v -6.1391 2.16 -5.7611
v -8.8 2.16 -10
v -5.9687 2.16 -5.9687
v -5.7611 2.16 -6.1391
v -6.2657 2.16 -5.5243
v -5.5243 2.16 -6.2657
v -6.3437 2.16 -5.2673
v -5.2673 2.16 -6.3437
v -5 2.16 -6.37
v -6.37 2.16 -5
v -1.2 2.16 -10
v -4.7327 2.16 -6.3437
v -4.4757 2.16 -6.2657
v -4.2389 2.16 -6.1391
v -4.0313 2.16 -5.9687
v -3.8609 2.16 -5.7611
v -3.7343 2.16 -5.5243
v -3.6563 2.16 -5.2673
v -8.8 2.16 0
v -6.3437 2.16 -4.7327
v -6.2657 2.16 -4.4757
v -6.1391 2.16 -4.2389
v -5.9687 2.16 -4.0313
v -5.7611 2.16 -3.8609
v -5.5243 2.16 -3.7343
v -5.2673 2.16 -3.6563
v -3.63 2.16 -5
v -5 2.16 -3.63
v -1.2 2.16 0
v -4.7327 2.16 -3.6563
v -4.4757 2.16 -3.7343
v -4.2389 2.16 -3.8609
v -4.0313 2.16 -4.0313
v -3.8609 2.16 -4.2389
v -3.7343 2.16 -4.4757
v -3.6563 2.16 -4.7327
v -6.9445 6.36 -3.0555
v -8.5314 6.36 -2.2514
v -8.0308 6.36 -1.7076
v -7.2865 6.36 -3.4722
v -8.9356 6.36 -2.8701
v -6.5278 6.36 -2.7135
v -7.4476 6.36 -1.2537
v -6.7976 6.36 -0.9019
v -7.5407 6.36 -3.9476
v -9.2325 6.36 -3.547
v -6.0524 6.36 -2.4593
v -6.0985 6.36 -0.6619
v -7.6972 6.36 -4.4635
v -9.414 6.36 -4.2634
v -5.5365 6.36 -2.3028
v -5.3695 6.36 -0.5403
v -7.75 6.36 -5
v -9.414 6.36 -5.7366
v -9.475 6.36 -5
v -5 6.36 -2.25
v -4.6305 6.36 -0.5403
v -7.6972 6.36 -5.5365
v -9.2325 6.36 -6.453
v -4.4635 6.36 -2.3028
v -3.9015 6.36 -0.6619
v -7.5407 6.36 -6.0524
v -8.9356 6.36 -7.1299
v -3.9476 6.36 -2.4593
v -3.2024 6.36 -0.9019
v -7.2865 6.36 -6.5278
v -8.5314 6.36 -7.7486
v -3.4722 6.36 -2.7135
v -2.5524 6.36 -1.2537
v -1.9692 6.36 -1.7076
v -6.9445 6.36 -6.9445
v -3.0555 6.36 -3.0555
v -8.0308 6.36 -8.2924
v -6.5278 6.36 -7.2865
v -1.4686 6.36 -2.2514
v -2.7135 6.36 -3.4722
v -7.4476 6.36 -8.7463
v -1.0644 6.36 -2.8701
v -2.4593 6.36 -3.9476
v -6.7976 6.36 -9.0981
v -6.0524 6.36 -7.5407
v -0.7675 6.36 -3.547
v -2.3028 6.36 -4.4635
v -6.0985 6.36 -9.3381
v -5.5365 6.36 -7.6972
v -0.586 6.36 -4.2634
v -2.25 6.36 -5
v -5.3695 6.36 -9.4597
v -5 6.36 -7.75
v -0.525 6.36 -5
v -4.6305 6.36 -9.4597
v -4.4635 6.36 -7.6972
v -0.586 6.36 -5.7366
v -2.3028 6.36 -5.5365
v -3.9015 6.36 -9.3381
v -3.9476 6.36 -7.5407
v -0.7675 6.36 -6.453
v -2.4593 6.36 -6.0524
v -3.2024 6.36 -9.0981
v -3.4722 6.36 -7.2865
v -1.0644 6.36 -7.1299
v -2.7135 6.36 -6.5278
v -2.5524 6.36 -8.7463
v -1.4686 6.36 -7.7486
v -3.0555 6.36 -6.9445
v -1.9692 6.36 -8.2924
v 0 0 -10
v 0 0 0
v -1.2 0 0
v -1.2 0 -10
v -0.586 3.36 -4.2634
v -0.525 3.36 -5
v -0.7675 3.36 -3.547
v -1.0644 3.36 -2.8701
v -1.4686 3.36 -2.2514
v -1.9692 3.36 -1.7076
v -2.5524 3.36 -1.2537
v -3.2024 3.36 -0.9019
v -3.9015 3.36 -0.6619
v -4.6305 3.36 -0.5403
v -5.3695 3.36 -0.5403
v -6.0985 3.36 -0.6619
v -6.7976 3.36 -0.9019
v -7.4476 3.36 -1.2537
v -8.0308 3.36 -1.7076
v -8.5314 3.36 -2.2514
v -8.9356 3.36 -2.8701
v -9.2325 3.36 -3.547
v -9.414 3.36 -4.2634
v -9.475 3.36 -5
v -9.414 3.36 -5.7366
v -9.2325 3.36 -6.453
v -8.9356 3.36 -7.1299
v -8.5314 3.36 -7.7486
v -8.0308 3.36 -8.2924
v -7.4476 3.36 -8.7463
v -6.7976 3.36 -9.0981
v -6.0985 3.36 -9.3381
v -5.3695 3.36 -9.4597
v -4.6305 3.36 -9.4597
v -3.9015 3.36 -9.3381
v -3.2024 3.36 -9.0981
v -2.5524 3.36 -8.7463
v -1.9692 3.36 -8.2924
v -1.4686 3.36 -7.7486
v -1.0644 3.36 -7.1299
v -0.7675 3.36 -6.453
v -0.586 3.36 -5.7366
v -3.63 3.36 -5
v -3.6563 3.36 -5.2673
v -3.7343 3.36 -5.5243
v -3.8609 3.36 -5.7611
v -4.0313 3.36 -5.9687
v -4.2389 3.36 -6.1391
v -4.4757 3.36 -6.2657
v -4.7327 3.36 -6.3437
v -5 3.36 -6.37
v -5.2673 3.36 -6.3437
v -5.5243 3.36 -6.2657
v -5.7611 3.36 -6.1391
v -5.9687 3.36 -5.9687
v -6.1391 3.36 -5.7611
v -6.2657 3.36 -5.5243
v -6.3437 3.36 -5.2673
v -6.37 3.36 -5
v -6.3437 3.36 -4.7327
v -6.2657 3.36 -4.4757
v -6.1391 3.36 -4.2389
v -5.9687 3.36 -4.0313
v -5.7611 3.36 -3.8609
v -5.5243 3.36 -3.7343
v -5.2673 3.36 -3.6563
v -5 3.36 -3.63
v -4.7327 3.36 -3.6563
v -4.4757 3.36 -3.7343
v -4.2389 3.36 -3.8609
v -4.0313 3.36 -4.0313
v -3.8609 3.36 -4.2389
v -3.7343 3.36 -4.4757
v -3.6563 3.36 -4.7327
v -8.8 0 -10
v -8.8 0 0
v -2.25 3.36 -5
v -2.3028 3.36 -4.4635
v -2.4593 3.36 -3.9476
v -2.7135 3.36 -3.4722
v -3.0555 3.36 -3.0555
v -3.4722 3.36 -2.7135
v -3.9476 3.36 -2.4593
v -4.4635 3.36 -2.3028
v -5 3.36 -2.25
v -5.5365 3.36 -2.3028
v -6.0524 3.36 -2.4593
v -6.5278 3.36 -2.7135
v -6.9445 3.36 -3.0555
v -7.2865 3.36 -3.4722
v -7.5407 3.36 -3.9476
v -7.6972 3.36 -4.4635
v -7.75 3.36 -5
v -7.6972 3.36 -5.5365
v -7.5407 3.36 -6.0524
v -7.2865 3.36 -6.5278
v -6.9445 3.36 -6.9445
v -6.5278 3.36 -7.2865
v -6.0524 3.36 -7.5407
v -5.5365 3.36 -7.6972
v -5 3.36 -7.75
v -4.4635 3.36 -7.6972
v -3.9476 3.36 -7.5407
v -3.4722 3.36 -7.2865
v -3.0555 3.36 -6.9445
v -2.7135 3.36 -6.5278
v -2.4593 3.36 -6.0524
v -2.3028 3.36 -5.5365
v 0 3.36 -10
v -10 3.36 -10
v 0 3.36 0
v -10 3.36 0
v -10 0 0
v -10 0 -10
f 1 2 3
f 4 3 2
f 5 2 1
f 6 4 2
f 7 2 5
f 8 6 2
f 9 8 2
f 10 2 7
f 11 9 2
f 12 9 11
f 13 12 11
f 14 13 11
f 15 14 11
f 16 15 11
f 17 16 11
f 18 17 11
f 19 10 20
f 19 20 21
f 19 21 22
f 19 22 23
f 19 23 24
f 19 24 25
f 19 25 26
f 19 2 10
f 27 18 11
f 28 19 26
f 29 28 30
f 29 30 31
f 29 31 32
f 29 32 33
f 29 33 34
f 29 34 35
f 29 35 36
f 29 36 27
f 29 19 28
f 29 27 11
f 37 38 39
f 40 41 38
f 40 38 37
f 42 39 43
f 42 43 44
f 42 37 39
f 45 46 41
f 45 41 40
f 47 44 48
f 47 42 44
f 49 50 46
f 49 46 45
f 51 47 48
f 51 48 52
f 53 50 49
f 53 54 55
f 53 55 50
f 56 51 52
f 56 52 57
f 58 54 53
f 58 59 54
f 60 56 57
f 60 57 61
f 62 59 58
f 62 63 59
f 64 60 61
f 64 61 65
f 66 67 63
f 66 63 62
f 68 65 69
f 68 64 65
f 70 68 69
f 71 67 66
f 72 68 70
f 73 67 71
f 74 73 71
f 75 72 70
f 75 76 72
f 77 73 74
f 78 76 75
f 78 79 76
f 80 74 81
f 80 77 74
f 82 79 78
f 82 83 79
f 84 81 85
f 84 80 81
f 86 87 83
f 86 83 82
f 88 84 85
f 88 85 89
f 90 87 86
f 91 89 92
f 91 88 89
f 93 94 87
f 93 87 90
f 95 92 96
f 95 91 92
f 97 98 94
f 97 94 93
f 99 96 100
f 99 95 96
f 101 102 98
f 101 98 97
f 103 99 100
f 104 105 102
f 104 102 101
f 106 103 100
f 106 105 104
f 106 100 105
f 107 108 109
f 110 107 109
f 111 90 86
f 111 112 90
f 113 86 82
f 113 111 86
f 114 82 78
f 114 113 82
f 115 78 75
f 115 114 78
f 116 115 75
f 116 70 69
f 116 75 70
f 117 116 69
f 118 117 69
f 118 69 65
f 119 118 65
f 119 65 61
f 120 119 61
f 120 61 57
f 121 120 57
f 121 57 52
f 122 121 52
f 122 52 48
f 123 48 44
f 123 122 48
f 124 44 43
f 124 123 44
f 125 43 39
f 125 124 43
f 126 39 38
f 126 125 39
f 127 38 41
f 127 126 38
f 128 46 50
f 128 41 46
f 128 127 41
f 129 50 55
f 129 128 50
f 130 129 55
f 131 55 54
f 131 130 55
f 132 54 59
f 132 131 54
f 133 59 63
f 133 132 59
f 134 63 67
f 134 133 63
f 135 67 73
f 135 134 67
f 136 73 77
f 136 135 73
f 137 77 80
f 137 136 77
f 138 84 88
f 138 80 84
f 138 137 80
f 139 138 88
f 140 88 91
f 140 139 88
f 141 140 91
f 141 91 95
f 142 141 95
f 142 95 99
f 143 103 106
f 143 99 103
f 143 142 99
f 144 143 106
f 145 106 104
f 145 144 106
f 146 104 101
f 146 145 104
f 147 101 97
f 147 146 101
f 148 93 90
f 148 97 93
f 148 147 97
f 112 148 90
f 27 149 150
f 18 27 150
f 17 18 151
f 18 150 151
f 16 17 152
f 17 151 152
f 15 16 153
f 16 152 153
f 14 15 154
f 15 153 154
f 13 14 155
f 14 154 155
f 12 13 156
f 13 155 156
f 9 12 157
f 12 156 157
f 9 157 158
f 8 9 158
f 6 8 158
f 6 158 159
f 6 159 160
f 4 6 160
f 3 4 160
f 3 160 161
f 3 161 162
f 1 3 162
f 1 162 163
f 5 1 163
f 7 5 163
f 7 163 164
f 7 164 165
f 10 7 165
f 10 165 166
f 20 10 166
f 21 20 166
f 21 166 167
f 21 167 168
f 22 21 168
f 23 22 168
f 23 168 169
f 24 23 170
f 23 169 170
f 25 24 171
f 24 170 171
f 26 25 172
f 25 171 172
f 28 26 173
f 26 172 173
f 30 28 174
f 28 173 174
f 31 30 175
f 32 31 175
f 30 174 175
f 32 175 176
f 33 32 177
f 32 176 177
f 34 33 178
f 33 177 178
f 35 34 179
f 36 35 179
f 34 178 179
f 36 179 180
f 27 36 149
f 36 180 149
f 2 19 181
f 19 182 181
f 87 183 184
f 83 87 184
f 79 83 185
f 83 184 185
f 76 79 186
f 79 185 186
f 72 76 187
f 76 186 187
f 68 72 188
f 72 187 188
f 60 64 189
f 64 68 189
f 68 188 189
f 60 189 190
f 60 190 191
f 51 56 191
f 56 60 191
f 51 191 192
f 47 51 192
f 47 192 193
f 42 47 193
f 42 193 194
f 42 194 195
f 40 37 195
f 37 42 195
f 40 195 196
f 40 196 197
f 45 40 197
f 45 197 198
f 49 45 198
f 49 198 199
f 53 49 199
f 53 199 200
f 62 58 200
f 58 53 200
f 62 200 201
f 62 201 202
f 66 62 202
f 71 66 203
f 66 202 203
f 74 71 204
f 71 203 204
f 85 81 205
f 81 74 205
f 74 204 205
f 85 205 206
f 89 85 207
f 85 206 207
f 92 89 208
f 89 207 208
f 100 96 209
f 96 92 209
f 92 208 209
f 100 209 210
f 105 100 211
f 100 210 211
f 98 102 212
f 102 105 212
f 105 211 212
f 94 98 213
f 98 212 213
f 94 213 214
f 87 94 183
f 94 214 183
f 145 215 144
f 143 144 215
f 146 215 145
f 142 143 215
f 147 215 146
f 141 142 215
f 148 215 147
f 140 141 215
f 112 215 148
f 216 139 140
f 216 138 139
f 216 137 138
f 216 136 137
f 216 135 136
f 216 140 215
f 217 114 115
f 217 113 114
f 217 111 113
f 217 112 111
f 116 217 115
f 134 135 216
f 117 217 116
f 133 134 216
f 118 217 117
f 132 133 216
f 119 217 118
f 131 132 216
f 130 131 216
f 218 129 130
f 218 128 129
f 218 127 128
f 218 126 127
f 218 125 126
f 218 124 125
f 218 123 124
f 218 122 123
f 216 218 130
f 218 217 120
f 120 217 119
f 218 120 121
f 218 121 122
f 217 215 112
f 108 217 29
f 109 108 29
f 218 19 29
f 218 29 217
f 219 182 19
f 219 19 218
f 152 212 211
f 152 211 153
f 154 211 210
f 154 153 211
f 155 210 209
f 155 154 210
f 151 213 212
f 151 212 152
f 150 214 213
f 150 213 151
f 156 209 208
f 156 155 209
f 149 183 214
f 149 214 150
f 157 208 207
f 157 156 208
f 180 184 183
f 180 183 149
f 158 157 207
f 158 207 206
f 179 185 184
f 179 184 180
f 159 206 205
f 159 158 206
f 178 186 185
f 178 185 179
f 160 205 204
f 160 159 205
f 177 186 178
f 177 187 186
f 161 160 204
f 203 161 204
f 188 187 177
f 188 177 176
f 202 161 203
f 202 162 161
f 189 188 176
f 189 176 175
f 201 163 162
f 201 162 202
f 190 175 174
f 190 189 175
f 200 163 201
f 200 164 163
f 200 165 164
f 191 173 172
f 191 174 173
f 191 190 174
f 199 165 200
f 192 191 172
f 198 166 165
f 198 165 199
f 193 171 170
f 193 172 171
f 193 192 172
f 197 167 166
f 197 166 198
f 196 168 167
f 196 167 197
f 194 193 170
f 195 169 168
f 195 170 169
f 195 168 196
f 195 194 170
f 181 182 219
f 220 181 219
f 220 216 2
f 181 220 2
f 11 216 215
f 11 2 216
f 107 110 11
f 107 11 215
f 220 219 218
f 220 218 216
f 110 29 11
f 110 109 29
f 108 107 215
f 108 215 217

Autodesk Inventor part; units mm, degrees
ref_plane "YZ Plane" through (0, 0, 0) normal (1, 0, 0) x (0, 1, 0)
ref_plane "XZ Plane" through (0, 0, 0) normal (0, 1, 0) x (-1, 0, 0)
ref_plane "XY Plane" through (0, 0, 0) normal (0, 0, 1) x (1, 0, 0)
sketch "Sketch1" plane through (0, 0, 0) normal (0, 1, 0) x (-1, 0, 0)
  line L0 (0, 0) -> (10, 0)
  line L1 (10, 0) -> (10, -10)
  line L2 (10, -10) -> (0, -10)
  line L3 (0, -10) -> (0, 0)
  dimension "d0" = 10
  dimension "d1" = 10
extrude "Extrusion1" add sketch "Sketch1" along normal blind 3.36
sketch "Sketch2" plane through (0, 3.36, 0) normal (0, 1, 0) x (1, 0, 0)
  line L0 (-10, 10) -> (-10, 0) projected
  circle A0 centre (-5, 5) radius 1.37
  point P0 (0, 0)
  dimension "d4" = 2.74
extrude "Extrusion2" cut sketch "Sketch2" against normal blind 3.36
sketch "Sketch3" plane through (0, 3.36, 0) normal (0, 1, 0) x (1, 0, 0)
  line L0 (-10, 10) -> (-10, 0) projected
  circle A0 centre (-5, 5) radius 2.75
  circle A1 centre (-5, 5) radius 4.475
  point P0 (0, 0)
  dimension "d7" = 5.5
  dimension "d8" = 8.95
extrude "Extrusion3" add sketch "Sketch3" along normal blind 3
sketch "Sketch4" plane through (0, 0, 0) normal (0, -1, 0) x (1, 0, 0)
  line L0 (-1.2, 0) -> (-1.2, -10)
  line L1 (-8.8, 0) -> (-8.8, -10)
  line L2 (-1.2, -10) -> (-8.8, -10)
  line L3 (0, -10) -> (-10, -10) projected
  line L4 (-8.8, 0) -> (-1.2, 0)
  line L5 (-10, 0) -> (0, 0) projected
  dimension "d11" = 1.2
extrude "Extrusion4" cut sketch "Sketch4" against normal blind 2.16
properties part number "MMAE 232 Assignment 2_Servo Horn 2 - Dylan Tamras"
